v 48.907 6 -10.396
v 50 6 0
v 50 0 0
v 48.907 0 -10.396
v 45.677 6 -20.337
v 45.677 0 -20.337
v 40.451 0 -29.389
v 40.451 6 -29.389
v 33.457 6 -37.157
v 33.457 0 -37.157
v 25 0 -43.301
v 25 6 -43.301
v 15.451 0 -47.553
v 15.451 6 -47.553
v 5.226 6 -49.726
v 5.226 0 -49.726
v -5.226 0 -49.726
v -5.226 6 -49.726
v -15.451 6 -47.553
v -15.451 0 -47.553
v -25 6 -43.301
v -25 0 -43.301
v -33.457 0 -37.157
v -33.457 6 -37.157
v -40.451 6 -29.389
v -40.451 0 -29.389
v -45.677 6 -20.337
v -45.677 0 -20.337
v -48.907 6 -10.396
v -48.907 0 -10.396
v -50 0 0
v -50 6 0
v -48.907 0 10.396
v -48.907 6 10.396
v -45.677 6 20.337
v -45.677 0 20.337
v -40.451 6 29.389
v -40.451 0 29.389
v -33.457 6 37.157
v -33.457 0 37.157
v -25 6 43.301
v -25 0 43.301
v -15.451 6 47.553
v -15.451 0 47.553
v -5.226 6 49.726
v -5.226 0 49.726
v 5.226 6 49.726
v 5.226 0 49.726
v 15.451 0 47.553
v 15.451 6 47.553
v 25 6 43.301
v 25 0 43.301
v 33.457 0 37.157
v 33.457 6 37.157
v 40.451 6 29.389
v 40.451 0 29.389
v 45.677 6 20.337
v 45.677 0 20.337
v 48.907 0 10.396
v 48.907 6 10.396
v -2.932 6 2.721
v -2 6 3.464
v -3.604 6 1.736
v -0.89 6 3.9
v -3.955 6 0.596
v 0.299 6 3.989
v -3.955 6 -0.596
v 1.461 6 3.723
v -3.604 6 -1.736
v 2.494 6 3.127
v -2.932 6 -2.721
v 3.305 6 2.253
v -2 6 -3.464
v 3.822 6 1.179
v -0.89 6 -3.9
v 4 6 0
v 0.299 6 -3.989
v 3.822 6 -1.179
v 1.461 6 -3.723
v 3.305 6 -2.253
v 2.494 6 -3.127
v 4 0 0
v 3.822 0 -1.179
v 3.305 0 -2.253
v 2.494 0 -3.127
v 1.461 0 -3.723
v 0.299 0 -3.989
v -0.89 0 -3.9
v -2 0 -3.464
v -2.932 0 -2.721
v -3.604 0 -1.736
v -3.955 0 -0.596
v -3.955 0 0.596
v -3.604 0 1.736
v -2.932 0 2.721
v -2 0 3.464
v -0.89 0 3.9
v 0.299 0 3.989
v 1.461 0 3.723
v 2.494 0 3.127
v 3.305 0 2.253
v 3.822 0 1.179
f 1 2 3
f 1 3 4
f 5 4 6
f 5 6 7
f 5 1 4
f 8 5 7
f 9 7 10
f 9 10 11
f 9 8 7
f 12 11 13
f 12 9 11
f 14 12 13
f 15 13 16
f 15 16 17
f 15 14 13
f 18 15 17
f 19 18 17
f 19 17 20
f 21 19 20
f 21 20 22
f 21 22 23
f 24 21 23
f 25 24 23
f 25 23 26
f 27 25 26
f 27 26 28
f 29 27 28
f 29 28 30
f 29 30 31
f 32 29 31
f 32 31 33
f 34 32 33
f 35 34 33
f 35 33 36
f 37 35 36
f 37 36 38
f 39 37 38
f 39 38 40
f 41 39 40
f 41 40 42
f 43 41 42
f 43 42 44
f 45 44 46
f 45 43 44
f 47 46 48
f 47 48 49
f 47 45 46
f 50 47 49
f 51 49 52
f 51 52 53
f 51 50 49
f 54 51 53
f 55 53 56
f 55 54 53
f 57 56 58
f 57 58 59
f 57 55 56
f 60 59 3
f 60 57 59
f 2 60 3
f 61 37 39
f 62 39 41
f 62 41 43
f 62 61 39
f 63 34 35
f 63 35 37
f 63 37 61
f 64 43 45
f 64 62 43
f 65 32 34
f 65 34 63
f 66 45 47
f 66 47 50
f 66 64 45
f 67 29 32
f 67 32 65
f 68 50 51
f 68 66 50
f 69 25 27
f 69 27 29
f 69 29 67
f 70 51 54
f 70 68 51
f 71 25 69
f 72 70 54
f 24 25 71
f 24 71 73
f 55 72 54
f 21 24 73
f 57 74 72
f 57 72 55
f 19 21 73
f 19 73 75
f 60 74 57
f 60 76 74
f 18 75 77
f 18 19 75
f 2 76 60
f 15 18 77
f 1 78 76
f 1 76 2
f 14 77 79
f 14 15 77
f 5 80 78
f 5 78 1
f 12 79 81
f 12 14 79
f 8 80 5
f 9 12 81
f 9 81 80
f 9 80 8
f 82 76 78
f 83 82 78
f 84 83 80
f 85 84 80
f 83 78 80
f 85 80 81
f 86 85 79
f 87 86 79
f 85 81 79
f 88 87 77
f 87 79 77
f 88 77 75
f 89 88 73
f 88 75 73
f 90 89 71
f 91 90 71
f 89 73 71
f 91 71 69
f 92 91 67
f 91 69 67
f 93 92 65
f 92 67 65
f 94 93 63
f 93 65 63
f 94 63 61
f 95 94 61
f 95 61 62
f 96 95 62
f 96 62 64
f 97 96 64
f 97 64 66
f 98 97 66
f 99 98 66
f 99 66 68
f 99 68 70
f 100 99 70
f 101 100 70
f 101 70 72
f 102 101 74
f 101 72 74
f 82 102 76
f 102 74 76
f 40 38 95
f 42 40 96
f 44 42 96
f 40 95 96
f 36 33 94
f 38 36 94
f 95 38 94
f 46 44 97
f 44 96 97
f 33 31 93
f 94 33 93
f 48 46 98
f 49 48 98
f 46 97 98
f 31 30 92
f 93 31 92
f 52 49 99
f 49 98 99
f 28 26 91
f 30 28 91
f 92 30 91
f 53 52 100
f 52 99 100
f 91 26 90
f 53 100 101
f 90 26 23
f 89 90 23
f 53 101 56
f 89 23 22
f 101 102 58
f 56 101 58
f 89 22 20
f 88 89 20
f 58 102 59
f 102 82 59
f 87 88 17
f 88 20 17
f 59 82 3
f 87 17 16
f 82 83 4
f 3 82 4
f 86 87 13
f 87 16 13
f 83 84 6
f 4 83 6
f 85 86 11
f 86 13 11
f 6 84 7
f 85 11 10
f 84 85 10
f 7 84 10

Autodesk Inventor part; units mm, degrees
ref_plane "YZ Plane" through (0, 0, 0) normal (1, 0, 0) x (0, 1, 0)
ref_plane "XZ Plane" through (0, 0, 0) normal (0, 1, 0) x (-1, 0, 0)
ref_plane "XY Plane" through (0, 0, 0) normal (0, 0, 1) x (1, 0, 0)
sketch "スケッチ1" plane through (0, 0, 0) normal (0, 1, 0) x (-1, 0, 0)
  circle A0 centre (0, 0) radius 25
  dimension "d0" = 50
extrude "押し出し1" add sketch "スケッチ1" along normal blind 6
sketch "スケッチ2" plane through (0, 6, 0) normal (0, 1, 0) x (1, 0, 0)
  circle A0 centre (0, 0) radius 4
  dimension "d3" = 8
extrude "押し出し2" cut sketch "スケッチ2" against normal blind 6
sketch "スケッチ3" plane through (0, 0, 0) normal (0, -1, 0) x (1, 0, 0)
  circle A0 centre (0, 0) radius 45
  circle A1 centre (0, 0) radius 4 projected
  circle A2 centre (0, 0) radius 25
  dimension "d6" = 90
  dimension "d7" = 50
extrude "押し出し3" add sketch "スケッチ3" against normal blind 6 contours A0
sketch "スケッチ4" plane through (0, 6, 0) normal (0, 1, 0) x (1, 0, 0)
  circle A0 centre (0, 0) radius 45
  circle A1 centre (0, 0) radius 50
  dimension "d10" = 90
  dimension "d11" = 100
extrude "押し出し4" add sketch "スケッチ4" against normal blind 6
properties part number "NHK_t0_3"
